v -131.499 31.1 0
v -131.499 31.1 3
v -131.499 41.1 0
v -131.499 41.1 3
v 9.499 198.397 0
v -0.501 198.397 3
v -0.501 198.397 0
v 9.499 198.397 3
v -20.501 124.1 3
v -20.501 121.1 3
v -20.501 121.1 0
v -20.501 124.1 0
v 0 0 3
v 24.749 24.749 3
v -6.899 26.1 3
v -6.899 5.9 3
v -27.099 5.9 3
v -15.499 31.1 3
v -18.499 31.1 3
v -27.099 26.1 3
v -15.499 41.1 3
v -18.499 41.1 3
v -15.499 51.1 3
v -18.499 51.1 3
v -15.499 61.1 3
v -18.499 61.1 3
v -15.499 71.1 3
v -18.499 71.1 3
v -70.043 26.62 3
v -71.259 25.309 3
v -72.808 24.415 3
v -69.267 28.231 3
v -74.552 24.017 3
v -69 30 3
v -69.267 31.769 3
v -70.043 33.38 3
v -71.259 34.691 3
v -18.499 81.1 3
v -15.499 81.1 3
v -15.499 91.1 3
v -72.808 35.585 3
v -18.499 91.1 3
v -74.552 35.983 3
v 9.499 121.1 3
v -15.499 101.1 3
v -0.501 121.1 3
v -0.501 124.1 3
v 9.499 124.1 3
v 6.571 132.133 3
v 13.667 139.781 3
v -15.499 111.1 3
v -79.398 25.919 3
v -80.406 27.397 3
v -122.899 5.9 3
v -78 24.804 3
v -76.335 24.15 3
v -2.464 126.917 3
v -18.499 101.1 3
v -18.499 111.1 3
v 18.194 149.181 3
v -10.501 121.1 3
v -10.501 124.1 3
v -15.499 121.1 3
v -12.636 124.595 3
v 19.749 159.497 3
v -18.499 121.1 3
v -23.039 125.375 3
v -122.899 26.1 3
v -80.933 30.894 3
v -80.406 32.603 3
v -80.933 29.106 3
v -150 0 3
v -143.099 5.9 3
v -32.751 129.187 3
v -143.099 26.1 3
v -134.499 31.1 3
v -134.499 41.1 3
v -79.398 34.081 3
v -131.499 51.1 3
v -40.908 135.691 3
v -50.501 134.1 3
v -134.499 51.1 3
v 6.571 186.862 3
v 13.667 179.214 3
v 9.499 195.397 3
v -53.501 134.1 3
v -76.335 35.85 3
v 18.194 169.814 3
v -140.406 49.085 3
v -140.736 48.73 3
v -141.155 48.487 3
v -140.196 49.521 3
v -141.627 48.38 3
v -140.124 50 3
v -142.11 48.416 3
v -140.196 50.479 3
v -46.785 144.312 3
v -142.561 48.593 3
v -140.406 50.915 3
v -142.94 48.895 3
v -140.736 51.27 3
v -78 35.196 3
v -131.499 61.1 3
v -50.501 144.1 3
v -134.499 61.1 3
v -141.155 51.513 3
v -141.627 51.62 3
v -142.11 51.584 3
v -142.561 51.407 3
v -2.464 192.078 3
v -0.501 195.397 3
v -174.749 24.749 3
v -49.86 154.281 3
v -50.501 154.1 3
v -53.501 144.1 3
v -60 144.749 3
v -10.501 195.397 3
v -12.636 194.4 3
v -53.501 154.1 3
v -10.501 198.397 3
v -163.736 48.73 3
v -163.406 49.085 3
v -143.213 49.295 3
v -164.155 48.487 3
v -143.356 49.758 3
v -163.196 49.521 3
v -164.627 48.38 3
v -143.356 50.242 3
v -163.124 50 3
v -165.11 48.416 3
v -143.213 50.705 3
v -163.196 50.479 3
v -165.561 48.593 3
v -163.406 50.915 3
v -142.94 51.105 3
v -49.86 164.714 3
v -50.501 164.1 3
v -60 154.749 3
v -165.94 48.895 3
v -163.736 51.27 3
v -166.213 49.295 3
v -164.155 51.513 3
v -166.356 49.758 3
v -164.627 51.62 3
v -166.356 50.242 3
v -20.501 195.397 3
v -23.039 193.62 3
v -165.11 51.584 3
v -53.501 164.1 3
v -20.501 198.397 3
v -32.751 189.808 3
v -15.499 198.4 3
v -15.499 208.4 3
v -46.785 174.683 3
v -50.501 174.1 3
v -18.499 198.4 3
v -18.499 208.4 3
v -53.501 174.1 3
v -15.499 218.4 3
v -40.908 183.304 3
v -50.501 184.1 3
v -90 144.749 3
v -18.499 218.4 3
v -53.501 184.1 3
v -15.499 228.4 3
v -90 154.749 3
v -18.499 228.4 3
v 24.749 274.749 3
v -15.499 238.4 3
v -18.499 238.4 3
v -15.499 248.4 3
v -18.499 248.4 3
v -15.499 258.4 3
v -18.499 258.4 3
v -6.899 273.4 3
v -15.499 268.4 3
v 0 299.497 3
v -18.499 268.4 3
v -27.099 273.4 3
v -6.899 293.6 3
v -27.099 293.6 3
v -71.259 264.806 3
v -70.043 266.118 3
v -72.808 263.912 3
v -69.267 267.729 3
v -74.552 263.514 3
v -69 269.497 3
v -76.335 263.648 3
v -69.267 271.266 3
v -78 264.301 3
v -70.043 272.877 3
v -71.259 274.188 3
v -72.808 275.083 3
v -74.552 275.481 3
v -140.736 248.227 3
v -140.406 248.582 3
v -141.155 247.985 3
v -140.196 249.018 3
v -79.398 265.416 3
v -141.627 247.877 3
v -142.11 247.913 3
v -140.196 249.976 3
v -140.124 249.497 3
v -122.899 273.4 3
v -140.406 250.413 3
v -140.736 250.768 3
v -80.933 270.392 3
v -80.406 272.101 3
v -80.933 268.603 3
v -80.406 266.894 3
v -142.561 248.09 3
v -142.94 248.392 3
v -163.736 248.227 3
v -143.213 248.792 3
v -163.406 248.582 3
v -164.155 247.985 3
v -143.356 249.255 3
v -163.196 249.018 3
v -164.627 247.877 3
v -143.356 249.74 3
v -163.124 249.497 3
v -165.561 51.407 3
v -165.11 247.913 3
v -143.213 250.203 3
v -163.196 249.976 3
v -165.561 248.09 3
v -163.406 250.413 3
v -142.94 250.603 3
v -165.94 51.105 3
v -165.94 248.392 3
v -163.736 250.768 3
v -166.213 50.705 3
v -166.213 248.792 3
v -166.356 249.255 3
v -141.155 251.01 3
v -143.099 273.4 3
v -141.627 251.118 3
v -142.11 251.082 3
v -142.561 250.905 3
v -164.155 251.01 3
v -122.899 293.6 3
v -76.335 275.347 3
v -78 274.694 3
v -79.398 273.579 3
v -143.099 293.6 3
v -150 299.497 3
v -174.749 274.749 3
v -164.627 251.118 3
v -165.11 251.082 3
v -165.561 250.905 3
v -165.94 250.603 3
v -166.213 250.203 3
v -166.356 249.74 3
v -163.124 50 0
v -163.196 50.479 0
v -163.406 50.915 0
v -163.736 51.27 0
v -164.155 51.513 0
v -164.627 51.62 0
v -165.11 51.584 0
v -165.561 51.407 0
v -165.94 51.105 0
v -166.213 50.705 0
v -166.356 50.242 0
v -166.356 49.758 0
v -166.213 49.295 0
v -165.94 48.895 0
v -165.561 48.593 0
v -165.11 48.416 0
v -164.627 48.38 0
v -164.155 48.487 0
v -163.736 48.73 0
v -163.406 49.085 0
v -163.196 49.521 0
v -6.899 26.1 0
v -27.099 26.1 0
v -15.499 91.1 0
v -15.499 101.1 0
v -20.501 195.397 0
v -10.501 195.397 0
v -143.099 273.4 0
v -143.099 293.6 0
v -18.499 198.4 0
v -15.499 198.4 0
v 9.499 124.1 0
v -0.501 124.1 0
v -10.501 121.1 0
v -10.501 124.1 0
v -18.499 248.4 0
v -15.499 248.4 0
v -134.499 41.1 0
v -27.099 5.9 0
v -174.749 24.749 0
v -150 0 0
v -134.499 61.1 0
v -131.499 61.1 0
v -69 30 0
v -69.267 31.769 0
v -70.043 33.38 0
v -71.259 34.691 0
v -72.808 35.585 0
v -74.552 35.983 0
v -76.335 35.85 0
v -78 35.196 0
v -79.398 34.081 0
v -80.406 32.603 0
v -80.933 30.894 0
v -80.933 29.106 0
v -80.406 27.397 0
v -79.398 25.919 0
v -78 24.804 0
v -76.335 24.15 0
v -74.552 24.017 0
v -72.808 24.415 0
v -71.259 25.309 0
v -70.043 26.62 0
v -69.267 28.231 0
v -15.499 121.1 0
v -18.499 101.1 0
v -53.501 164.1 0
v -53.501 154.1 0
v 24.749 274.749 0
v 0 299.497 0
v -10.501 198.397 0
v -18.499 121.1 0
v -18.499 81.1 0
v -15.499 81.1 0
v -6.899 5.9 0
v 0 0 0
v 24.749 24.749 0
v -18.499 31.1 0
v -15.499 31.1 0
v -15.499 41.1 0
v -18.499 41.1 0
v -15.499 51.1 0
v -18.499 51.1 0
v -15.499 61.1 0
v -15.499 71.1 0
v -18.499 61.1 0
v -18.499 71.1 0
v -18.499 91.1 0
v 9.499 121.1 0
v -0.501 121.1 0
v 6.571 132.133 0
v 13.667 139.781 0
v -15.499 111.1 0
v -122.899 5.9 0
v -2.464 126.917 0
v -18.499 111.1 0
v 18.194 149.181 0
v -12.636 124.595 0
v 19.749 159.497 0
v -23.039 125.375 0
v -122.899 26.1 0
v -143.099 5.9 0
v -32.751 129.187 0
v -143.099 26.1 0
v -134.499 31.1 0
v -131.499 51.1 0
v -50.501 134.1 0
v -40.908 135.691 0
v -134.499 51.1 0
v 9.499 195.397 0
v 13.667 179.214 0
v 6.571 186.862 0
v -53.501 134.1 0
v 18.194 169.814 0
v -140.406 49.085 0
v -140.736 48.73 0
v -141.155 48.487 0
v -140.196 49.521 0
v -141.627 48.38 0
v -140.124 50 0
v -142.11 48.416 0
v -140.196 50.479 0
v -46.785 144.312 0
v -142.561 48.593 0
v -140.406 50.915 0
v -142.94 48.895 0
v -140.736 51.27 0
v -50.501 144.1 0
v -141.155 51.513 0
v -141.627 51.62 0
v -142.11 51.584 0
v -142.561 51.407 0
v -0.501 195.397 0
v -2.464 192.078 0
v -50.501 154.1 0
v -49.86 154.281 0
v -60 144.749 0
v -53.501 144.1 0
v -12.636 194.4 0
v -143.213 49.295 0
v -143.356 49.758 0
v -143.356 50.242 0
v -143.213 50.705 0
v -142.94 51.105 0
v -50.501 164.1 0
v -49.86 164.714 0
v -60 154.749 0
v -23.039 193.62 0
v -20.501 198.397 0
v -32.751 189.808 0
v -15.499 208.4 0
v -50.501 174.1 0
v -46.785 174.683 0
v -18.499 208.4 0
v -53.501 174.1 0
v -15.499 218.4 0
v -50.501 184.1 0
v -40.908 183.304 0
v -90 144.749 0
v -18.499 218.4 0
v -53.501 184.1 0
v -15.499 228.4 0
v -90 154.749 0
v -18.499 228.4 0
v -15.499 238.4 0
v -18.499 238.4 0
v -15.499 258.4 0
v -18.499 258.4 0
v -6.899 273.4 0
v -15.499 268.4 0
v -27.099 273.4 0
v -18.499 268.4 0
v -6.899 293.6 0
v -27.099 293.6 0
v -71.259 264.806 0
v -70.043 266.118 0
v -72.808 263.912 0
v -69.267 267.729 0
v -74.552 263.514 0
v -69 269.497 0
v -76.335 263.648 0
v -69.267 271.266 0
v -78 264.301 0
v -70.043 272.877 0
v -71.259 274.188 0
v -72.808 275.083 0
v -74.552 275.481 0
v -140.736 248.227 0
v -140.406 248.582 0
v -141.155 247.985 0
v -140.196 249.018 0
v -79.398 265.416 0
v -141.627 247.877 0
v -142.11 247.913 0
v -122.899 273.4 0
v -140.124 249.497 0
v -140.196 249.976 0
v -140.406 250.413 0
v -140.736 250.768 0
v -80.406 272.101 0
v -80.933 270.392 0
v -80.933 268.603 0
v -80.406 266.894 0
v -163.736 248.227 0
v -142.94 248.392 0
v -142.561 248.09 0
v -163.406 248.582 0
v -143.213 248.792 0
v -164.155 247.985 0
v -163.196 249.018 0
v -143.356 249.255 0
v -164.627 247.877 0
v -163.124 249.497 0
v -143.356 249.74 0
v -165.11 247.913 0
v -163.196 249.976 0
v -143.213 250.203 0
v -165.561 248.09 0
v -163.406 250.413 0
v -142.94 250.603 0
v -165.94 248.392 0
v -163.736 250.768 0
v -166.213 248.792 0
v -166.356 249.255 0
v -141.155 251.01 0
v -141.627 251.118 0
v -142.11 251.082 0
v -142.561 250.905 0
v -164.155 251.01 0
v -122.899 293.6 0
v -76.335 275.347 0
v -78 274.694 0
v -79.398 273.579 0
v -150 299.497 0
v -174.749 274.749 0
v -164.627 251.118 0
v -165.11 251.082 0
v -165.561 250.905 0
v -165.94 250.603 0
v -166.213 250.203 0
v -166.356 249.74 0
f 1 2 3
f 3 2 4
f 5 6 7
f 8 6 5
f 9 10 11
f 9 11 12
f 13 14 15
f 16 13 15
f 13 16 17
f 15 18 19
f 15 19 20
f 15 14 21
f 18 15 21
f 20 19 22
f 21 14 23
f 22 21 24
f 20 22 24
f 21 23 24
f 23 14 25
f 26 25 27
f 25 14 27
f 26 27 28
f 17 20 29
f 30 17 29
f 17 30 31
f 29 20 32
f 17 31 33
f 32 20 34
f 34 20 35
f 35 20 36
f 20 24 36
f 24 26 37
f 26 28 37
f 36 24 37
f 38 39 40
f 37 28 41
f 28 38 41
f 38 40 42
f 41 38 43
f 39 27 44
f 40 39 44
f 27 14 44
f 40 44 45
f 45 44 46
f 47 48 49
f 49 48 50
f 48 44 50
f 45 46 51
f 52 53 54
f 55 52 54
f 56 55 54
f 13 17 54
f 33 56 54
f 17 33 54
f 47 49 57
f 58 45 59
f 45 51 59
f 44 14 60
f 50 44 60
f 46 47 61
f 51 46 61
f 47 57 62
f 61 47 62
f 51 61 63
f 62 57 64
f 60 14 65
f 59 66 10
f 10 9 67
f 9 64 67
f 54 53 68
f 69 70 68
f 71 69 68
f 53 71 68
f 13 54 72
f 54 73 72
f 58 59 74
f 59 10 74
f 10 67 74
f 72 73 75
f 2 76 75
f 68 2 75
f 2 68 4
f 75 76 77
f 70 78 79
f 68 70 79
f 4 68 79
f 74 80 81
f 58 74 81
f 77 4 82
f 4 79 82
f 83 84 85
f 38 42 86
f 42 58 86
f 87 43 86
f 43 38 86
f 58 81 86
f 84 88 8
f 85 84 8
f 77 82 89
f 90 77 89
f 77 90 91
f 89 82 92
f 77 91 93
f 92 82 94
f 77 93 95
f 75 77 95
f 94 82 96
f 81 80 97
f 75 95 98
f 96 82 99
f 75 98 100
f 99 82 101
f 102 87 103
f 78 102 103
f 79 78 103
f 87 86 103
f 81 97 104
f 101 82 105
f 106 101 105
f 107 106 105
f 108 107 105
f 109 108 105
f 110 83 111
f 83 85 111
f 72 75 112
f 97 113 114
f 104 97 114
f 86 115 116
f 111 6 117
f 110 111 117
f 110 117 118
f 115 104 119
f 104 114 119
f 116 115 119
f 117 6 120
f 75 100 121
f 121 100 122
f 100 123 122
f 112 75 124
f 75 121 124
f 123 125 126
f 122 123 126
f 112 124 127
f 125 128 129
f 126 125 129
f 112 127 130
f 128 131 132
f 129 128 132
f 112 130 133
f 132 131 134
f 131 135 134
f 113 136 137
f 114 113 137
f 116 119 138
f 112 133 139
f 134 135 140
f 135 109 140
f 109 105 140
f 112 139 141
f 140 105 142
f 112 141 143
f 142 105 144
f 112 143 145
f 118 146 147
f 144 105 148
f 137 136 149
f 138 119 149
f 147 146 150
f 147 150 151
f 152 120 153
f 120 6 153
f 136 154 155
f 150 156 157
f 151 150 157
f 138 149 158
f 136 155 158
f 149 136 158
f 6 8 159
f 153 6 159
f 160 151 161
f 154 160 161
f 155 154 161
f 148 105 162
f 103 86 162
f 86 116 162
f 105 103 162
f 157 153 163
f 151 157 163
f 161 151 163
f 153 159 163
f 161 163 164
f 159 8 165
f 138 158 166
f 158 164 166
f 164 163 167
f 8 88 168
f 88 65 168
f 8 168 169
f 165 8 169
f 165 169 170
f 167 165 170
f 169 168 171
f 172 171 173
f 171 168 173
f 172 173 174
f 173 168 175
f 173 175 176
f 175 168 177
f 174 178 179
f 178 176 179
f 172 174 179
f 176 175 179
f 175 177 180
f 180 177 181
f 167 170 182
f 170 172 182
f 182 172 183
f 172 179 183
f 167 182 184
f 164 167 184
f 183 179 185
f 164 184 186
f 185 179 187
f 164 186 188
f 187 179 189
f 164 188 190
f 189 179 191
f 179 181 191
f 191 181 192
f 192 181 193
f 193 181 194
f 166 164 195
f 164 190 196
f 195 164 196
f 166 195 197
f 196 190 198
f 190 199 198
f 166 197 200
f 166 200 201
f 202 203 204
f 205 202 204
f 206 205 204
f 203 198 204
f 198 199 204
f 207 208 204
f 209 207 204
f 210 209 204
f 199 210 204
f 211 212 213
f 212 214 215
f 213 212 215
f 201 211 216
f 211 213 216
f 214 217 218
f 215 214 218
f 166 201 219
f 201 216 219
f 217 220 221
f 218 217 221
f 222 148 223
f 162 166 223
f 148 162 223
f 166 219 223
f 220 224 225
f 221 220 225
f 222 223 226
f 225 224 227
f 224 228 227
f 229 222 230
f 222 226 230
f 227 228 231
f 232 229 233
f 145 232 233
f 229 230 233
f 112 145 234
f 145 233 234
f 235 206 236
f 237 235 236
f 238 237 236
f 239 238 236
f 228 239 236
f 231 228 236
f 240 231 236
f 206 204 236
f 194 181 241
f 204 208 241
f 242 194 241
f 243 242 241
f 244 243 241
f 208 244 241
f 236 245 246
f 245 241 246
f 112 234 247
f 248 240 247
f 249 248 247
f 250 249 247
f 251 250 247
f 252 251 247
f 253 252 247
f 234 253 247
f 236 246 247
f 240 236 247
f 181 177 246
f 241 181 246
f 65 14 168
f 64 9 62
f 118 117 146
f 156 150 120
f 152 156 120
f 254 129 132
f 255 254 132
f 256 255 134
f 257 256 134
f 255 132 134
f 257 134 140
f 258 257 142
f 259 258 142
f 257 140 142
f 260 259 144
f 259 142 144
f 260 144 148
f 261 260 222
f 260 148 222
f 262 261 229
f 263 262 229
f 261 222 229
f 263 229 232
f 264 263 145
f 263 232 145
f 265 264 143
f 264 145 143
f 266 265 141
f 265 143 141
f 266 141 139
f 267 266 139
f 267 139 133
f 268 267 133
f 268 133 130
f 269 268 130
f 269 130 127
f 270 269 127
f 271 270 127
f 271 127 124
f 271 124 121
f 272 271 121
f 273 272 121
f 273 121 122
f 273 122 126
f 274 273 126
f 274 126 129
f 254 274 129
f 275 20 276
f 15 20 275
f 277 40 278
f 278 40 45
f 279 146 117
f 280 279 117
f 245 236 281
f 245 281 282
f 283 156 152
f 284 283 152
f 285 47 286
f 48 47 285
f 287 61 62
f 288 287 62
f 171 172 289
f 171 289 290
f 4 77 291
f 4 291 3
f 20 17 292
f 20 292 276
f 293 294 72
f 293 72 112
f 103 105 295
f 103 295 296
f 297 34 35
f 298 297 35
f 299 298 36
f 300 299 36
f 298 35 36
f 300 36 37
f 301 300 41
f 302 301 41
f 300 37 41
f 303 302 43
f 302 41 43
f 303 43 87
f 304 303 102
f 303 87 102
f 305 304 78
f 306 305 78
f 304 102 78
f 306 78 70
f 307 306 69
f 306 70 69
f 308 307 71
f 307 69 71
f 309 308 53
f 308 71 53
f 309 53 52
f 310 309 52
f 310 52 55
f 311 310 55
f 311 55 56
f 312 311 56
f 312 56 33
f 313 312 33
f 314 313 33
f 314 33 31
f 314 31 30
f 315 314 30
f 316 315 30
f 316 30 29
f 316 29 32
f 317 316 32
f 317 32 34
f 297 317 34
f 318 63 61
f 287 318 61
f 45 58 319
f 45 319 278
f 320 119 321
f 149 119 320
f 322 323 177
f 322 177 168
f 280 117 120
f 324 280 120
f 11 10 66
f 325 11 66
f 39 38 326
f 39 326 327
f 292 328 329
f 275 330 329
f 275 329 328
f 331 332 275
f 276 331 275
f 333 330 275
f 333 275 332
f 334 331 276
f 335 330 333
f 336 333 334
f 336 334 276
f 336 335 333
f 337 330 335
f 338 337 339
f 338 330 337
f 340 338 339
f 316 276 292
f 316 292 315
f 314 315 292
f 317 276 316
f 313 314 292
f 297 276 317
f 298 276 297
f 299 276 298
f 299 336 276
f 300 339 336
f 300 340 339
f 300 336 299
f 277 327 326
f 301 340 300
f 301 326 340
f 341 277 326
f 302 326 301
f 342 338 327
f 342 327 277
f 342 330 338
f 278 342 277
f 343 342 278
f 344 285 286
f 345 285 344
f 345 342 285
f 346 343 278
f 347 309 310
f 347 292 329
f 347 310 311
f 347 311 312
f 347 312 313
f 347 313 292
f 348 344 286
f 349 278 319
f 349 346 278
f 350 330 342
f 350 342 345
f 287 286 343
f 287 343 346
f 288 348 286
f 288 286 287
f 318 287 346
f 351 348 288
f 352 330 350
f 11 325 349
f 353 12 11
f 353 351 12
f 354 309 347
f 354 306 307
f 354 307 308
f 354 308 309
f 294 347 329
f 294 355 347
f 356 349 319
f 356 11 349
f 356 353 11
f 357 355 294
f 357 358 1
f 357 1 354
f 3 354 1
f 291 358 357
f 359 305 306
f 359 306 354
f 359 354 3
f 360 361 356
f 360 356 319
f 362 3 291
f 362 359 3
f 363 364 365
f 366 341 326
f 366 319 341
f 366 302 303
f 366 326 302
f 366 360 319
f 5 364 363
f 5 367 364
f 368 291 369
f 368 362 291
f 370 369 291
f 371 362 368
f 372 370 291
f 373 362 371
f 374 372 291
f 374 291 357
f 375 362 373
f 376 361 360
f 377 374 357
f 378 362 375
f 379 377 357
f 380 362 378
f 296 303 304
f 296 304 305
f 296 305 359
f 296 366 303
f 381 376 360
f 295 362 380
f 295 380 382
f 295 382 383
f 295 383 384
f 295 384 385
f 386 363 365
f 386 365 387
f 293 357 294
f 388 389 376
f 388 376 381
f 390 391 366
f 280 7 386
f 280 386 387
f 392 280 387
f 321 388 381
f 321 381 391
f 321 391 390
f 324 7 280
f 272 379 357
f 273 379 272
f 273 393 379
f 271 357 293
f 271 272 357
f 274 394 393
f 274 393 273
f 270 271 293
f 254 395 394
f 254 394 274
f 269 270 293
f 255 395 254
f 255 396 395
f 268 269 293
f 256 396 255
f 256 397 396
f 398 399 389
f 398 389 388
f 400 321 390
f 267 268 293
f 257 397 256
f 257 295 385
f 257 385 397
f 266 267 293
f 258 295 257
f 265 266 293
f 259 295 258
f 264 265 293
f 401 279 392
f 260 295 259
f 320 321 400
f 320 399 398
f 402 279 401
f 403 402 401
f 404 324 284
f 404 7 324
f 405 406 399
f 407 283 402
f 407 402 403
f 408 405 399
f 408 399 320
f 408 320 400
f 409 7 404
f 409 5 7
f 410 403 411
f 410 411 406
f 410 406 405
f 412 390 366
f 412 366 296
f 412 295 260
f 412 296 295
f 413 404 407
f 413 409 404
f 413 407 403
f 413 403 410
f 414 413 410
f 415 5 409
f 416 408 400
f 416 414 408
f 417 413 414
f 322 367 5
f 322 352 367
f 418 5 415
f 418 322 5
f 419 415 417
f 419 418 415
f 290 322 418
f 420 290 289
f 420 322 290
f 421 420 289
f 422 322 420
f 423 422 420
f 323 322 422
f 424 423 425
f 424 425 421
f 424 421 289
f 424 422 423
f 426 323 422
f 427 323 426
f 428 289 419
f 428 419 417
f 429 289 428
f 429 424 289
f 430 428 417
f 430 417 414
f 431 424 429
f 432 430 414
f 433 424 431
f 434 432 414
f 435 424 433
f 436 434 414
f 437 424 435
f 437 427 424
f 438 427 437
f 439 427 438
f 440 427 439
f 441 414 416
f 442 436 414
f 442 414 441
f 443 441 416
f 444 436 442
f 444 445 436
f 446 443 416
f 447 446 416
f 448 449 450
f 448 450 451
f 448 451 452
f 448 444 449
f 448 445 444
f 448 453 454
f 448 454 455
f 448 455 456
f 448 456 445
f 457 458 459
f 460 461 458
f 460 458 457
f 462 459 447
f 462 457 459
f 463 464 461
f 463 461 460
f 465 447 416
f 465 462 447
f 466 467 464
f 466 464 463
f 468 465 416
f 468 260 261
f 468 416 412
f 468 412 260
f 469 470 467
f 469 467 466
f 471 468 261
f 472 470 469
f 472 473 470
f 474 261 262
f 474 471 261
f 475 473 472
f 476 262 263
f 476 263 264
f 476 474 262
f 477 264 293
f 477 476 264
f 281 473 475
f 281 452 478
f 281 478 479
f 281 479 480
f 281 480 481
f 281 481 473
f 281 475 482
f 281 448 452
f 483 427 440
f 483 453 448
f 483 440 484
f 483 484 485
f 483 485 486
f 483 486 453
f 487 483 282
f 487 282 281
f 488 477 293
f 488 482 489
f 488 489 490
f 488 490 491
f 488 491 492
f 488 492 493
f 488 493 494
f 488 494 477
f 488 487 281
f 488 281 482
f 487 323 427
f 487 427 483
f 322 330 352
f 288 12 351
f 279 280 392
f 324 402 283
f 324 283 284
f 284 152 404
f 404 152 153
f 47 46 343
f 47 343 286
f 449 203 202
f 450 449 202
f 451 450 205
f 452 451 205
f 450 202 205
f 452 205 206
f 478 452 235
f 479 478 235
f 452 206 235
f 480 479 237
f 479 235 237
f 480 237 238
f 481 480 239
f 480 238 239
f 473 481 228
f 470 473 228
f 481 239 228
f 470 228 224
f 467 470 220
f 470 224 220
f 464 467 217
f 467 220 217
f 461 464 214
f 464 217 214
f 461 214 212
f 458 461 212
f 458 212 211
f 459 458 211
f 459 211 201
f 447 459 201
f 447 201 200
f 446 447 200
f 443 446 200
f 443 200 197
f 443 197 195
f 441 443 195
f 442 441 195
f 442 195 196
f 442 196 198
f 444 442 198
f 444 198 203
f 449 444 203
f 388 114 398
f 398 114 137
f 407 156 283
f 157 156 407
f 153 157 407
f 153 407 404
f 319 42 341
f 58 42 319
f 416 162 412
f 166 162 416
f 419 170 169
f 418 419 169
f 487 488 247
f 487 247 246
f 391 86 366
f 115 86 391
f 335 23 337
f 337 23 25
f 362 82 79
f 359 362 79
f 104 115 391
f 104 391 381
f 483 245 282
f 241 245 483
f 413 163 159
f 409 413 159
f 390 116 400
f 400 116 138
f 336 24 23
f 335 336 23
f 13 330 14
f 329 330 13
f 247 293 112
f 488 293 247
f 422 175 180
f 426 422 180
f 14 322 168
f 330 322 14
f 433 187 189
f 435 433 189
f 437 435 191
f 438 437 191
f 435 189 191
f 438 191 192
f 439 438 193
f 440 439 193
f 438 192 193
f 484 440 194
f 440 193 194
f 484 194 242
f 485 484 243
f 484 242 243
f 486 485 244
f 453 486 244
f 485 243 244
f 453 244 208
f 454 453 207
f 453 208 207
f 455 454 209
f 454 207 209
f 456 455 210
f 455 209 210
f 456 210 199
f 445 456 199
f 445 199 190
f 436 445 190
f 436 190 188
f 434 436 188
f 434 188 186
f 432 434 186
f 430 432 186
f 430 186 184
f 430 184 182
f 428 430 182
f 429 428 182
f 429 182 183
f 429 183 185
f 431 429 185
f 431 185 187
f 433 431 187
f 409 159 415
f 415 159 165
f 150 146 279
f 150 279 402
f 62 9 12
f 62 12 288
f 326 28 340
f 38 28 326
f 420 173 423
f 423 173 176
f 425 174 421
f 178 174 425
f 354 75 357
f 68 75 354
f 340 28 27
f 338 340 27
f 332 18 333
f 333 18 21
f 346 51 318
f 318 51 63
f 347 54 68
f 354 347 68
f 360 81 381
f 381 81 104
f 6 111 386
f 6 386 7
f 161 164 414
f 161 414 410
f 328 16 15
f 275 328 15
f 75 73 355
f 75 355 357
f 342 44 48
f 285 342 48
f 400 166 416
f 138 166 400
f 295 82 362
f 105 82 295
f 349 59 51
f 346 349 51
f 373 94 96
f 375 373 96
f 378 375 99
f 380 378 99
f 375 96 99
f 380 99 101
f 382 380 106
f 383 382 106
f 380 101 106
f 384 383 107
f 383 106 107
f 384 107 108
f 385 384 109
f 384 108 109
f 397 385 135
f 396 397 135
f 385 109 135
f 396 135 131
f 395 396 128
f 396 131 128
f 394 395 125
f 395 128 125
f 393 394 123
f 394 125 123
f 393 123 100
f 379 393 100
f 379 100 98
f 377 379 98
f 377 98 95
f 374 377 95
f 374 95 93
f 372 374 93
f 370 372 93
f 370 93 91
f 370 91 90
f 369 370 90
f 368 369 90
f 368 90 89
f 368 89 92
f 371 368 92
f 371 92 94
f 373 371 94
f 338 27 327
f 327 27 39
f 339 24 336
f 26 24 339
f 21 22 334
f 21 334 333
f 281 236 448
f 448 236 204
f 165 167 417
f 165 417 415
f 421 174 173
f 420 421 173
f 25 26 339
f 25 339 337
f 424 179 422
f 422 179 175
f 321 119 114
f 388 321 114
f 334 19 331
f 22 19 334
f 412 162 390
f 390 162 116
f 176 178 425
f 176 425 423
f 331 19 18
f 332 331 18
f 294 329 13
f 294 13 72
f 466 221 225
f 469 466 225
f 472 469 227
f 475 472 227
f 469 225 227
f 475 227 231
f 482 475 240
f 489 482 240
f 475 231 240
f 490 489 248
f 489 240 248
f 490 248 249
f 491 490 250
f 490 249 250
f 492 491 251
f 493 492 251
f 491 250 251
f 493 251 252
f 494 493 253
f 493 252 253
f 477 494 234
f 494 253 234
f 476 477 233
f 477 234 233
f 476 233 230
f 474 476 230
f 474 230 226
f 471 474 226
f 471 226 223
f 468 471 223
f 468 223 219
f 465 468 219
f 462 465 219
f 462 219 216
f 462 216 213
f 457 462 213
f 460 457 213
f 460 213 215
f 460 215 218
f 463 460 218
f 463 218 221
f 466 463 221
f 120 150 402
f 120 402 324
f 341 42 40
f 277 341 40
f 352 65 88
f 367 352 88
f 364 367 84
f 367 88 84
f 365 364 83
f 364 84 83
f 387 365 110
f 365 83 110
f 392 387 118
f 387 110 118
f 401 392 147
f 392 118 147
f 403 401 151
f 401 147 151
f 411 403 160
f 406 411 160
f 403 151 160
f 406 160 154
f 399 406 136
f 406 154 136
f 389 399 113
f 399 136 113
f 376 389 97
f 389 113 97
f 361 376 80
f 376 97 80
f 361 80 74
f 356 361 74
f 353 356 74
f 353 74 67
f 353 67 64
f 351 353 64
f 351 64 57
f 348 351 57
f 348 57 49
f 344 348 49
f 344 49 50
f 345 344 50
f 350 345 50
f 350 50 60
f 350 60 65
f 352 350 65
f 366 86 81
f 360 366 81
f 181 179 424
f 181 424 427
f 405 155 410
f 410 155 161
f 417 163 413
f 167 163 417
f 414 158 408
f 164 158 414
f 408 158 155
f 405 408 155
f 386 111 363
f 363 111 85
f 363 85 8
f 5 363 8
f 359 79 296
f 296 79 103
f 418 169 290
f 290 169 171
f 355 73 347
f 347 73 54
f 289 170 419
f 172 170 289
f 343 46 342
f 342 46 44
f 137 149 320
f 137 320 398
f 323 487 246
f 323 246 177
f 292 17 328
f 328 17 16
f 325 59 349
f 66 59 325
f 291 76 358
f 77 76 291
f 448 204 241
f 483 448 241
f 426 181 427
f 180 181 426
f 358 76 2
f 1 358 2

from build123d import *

# Parameters (mm, degrees)
BASE_DEPTH                      = 3
ESQUISSE3_W                     = 20.2
ESQUISSE3_H                     = 20.2
ENL_V_MAT_EXTRU_1_DEPTH         = 4
R_P_TITION_LIN_AIRE1_COUNT      = 2
R_P_TITION_LIN_AIRE1_PITCH      = 267.5
R_P_TITION_LIN_AIRE1_COUNT_DIR2 = 2
R_P_TITION_LIN_AIRE1_PITCH_DIR2 = 116
ESQUISSE4_R                     = 35
ENL_V_MAT_EXTRU_2_DEPTH         = 4
ESQUISSE5_R                     = 6
ESQUISSE5_W                     = 30
ESQUISSE5_H                     = 10
ENL_V_MAT_EXTRU_3_DEPTH         = 4
ESQUISSE6_R                     = 1.625
ENL_V_MAT_EXTRU_4_DEPTH         = 4
SKETCH1_W                       = 3
SKETCH1_H                       = 10
CUT_EXTRUDE1_DEPTH              = 4
LPATTERN1_COUNT                 = 4
LPATTERN1_PITCH                 = 20
SKETCH2_W                       = 3
SKETCH2_H                       = 10
CUT_EXTRUDE2_DEPTH              = 4
LPATTERN2_COUNT                 = 5
LPATTERN2_PITCH                 = 20
SKETCH4_W                       = 3
SKETCH4_H                       = 10
CUT_EXTRUDE3_DEPTH              = 4
LPATTERN3_COUNT                 = 2
LPATTERN3_PITCH                 = 20
ESQUISSE7_W                     = 10
ESQUISSE7_H                     = 3
ENL_V_MAT_EXTRU_5_DEPTH         = 3
ESQUISSE8_W                     = 3
ESQUISSE8_H                     = 10
ENL_V_MAT_EXTRU_6_DEPTH         = 3


with BuildPart() as part:
    # Esquisse1 → Base (new body)
    with BuildSketch(Plane.XY):
        Polygon((24.748737342, 24.748737342), (0, 0), (-150, 0), (-174.748737342, 24.748737342), (-174.748737342, 274.748737342), (-150, 299.497474683), (0, 299.497474683), (24.748737342, 274.748737342), align=None)
    extrude(amount=BASE_DEPTH)

    # Esquisse3 → Enlèv. mat.-Extru.1 (cut, through all)
    with BuildSketch(Plane.XY.offset(3)):
        with Locations((-132.998737342, 16)):
            Rectangle(ESQUISSE3_W, ESQUISSE3_H)
    enl_v_mat_extru_1 = extrude(amount=-ENL_V_MAT_EXTRU_1_DEPTH, mode=Mode.SUBTRACT)

    # Répétition linéaire1: Enl_v. mat.-Extru.1 2 × 2
    with Locations(*[(j * R_P_TITION_LIN_AIRE1_PITCH_DIR2, i * R_P_TITION_LIN_AIRE1_PITCH, 0) for i in range(R_P_TITION_LIN_AIRE1_COUNT) for j in range(R_P_TITION_LIN_AIRE1_COUNT_DIR2) if (i, j) != (0, 0)]):
        add(enl_v_mat_extru_1, mode=Mode.SUBTRACT)

    # Esquisse4 → Enlèv. mat.-Extru.2 (cut, through all)
    with BuildSketch(Plane.XY.offset(3)):
        with Locations((-15.251262658, 159.497474683)):
            Circle(ESQUISSE4_R)
    extrude(amount=-ENL_V_MAT_EXTRU_2_DEPTH, mode=Mode.SUBTRACT)

    # Esquisse5 → Enlèv. mat.-Extru.3 (cut, through all)
    with BuildSketch(Plane.XY.offset(3)):
        with Locations((-75, 30)):
            Circle(ESQUISSE5_R)
        with Locations((-75, 269.497474683)):
            Circle(ESQUISSE5_R)
        with Locations((-75, 149.748737342)):
            Rectangle(ESQUISSE5_W, ESQUISSE5_H)
    extrude(amount=-ENL_V_MAT_EXTRU_3_DEPTH, mode=Mode.SUBTRACT)

    # Esquisse6 → Enlèv. mat.-Extru.4 (cut, through all)
    with BuildSketch(Plane.XY.offset(3)):
        with Locations((-164.748737342, 249.497474683)):
            Circle(ESQUISSE6_R)
        with Locations((-141.748737342, 249.497474683)):
            Circle(ESQUISSE6_R)
        with Locations((-164.748737342, 50)):
            Circle(ESQUISSE6_R)
        with Locations((-141.748737342, 50)):
            Circle(ESQUISSE6_R)
    extrude(amount=-ENL_V_MAT_EXTRU_4_DEPTH, mode=Mode.SUBTRACT)

    # Sketch1 → Cut-Extrude1 (cut, through all)
    with BuildSketch(Plane.XY.offset(3)):
        with Locations((-16.998737342, 263.4)):
            Rectangle(SKETCH1_W, SKETCH1_H)
    cut_extrude1 = extrude(amount=-CUT_EXTRUDE1_DEPTH, mode=Mode.SUBTRACT)

    # LPattern1: Cut-Extrude1 ×4
    with Locations(*[(0, -i * LPATTERN1_PITCH, 0) for i in range(1, LPATTERN1_COUNT)]):
        add(cut_extrude1, mode=Mode.SUBTRACT)

    # Sketch2 → Cut-Extrude2 (cut, through all)
    with BuildSketch(Plane.XY.offset(3)):
        with Locations((-16.998737342, 36.1)):
            Rectangle(SKETCH2_W, SKETCH2_H)
    cut_extrude2 = extrude(amount=-CUT_EXTRUDE2_DEPTH, mode=Mode.SUBTRACT)

    # LPattern2: Cut-Extrude2 ×5
    with Locations(*[(0, i * LPATTERN2_PITCH, 0) for i in range(1, LPATTERN2_COUNT)]):
        add(cut_extrude2, mode=Mode.SUBTRACT)

    # Sketch4 → Cut-Extrude3 (cut, through all)
    with BuildSketch(Plane.XY.offset(3)):
        with Locations((-132.998737342, 36.1)):
            Rectangle(SKETCH4_W, SKETCH4_H)
    cut_extrude3 = extrude(amount=-CUT_EXTRUDE3_DEPTH, mode=Mode.SUBTRACT)

    # LPattern3: Cut-Extrude3 ×2
    with Locations(*[(0, i * LPATTERN3_PITCH, 0) for i in range(1, LPATTERN3_COUNT)]):
        add(cut_extrude3, mode=Mode.SUBTRACT)

    # Esquisse7 → Enlèv. mat.-Extru.5 (cut)
    with BuildSketch(Plane.XY.offset(3)):
        with Locations((4.498737342, 122.6)):
            Rectangle(ESQUISSE7_W, ESQUISSE7_H)
        with Locations((-15.501262658, 196.897474683)):
            Rectangle(ESQUISSE7_W, ESQUISSE7_H)
        with Locations((4.498737342, 196.897474683)):
            Rectangle(ESQUISSE7_W, ESQUISSE7_H)
        with Locations((-15.501262658, 122.6)):
            Rectangle(ESQUISSE7_W, ESQUISSE7_H)
    extrude(amount=-ENL_V_MAT_EXTRU_5_DEPTH, mode=Mode.SUBTRACT)

    # Esquisse8 → Enlèv. mat.-Extru.6 (cut)
    with BuildSketch(Plane.XY.offset(3)):
        with Locations((-52.001262658, 159.1)):
            Rectangle(ESQUISSE8_W, ESQUISSE8_H)
        with Locations((-52.001262658, 139.1)):
            Rectangle(ESQUISSE8_W, ESQUISSE8_H)
        with Locations((-52.001262658, 179.1)):
            Rectangle(ESQUISSE8_W, ESQUISSE8_H)
    extrude(amount=-ENL_V_MAT_EXTRU_6_DEPTH, mode=Mode.SUBTRACT)


solid = part.part
